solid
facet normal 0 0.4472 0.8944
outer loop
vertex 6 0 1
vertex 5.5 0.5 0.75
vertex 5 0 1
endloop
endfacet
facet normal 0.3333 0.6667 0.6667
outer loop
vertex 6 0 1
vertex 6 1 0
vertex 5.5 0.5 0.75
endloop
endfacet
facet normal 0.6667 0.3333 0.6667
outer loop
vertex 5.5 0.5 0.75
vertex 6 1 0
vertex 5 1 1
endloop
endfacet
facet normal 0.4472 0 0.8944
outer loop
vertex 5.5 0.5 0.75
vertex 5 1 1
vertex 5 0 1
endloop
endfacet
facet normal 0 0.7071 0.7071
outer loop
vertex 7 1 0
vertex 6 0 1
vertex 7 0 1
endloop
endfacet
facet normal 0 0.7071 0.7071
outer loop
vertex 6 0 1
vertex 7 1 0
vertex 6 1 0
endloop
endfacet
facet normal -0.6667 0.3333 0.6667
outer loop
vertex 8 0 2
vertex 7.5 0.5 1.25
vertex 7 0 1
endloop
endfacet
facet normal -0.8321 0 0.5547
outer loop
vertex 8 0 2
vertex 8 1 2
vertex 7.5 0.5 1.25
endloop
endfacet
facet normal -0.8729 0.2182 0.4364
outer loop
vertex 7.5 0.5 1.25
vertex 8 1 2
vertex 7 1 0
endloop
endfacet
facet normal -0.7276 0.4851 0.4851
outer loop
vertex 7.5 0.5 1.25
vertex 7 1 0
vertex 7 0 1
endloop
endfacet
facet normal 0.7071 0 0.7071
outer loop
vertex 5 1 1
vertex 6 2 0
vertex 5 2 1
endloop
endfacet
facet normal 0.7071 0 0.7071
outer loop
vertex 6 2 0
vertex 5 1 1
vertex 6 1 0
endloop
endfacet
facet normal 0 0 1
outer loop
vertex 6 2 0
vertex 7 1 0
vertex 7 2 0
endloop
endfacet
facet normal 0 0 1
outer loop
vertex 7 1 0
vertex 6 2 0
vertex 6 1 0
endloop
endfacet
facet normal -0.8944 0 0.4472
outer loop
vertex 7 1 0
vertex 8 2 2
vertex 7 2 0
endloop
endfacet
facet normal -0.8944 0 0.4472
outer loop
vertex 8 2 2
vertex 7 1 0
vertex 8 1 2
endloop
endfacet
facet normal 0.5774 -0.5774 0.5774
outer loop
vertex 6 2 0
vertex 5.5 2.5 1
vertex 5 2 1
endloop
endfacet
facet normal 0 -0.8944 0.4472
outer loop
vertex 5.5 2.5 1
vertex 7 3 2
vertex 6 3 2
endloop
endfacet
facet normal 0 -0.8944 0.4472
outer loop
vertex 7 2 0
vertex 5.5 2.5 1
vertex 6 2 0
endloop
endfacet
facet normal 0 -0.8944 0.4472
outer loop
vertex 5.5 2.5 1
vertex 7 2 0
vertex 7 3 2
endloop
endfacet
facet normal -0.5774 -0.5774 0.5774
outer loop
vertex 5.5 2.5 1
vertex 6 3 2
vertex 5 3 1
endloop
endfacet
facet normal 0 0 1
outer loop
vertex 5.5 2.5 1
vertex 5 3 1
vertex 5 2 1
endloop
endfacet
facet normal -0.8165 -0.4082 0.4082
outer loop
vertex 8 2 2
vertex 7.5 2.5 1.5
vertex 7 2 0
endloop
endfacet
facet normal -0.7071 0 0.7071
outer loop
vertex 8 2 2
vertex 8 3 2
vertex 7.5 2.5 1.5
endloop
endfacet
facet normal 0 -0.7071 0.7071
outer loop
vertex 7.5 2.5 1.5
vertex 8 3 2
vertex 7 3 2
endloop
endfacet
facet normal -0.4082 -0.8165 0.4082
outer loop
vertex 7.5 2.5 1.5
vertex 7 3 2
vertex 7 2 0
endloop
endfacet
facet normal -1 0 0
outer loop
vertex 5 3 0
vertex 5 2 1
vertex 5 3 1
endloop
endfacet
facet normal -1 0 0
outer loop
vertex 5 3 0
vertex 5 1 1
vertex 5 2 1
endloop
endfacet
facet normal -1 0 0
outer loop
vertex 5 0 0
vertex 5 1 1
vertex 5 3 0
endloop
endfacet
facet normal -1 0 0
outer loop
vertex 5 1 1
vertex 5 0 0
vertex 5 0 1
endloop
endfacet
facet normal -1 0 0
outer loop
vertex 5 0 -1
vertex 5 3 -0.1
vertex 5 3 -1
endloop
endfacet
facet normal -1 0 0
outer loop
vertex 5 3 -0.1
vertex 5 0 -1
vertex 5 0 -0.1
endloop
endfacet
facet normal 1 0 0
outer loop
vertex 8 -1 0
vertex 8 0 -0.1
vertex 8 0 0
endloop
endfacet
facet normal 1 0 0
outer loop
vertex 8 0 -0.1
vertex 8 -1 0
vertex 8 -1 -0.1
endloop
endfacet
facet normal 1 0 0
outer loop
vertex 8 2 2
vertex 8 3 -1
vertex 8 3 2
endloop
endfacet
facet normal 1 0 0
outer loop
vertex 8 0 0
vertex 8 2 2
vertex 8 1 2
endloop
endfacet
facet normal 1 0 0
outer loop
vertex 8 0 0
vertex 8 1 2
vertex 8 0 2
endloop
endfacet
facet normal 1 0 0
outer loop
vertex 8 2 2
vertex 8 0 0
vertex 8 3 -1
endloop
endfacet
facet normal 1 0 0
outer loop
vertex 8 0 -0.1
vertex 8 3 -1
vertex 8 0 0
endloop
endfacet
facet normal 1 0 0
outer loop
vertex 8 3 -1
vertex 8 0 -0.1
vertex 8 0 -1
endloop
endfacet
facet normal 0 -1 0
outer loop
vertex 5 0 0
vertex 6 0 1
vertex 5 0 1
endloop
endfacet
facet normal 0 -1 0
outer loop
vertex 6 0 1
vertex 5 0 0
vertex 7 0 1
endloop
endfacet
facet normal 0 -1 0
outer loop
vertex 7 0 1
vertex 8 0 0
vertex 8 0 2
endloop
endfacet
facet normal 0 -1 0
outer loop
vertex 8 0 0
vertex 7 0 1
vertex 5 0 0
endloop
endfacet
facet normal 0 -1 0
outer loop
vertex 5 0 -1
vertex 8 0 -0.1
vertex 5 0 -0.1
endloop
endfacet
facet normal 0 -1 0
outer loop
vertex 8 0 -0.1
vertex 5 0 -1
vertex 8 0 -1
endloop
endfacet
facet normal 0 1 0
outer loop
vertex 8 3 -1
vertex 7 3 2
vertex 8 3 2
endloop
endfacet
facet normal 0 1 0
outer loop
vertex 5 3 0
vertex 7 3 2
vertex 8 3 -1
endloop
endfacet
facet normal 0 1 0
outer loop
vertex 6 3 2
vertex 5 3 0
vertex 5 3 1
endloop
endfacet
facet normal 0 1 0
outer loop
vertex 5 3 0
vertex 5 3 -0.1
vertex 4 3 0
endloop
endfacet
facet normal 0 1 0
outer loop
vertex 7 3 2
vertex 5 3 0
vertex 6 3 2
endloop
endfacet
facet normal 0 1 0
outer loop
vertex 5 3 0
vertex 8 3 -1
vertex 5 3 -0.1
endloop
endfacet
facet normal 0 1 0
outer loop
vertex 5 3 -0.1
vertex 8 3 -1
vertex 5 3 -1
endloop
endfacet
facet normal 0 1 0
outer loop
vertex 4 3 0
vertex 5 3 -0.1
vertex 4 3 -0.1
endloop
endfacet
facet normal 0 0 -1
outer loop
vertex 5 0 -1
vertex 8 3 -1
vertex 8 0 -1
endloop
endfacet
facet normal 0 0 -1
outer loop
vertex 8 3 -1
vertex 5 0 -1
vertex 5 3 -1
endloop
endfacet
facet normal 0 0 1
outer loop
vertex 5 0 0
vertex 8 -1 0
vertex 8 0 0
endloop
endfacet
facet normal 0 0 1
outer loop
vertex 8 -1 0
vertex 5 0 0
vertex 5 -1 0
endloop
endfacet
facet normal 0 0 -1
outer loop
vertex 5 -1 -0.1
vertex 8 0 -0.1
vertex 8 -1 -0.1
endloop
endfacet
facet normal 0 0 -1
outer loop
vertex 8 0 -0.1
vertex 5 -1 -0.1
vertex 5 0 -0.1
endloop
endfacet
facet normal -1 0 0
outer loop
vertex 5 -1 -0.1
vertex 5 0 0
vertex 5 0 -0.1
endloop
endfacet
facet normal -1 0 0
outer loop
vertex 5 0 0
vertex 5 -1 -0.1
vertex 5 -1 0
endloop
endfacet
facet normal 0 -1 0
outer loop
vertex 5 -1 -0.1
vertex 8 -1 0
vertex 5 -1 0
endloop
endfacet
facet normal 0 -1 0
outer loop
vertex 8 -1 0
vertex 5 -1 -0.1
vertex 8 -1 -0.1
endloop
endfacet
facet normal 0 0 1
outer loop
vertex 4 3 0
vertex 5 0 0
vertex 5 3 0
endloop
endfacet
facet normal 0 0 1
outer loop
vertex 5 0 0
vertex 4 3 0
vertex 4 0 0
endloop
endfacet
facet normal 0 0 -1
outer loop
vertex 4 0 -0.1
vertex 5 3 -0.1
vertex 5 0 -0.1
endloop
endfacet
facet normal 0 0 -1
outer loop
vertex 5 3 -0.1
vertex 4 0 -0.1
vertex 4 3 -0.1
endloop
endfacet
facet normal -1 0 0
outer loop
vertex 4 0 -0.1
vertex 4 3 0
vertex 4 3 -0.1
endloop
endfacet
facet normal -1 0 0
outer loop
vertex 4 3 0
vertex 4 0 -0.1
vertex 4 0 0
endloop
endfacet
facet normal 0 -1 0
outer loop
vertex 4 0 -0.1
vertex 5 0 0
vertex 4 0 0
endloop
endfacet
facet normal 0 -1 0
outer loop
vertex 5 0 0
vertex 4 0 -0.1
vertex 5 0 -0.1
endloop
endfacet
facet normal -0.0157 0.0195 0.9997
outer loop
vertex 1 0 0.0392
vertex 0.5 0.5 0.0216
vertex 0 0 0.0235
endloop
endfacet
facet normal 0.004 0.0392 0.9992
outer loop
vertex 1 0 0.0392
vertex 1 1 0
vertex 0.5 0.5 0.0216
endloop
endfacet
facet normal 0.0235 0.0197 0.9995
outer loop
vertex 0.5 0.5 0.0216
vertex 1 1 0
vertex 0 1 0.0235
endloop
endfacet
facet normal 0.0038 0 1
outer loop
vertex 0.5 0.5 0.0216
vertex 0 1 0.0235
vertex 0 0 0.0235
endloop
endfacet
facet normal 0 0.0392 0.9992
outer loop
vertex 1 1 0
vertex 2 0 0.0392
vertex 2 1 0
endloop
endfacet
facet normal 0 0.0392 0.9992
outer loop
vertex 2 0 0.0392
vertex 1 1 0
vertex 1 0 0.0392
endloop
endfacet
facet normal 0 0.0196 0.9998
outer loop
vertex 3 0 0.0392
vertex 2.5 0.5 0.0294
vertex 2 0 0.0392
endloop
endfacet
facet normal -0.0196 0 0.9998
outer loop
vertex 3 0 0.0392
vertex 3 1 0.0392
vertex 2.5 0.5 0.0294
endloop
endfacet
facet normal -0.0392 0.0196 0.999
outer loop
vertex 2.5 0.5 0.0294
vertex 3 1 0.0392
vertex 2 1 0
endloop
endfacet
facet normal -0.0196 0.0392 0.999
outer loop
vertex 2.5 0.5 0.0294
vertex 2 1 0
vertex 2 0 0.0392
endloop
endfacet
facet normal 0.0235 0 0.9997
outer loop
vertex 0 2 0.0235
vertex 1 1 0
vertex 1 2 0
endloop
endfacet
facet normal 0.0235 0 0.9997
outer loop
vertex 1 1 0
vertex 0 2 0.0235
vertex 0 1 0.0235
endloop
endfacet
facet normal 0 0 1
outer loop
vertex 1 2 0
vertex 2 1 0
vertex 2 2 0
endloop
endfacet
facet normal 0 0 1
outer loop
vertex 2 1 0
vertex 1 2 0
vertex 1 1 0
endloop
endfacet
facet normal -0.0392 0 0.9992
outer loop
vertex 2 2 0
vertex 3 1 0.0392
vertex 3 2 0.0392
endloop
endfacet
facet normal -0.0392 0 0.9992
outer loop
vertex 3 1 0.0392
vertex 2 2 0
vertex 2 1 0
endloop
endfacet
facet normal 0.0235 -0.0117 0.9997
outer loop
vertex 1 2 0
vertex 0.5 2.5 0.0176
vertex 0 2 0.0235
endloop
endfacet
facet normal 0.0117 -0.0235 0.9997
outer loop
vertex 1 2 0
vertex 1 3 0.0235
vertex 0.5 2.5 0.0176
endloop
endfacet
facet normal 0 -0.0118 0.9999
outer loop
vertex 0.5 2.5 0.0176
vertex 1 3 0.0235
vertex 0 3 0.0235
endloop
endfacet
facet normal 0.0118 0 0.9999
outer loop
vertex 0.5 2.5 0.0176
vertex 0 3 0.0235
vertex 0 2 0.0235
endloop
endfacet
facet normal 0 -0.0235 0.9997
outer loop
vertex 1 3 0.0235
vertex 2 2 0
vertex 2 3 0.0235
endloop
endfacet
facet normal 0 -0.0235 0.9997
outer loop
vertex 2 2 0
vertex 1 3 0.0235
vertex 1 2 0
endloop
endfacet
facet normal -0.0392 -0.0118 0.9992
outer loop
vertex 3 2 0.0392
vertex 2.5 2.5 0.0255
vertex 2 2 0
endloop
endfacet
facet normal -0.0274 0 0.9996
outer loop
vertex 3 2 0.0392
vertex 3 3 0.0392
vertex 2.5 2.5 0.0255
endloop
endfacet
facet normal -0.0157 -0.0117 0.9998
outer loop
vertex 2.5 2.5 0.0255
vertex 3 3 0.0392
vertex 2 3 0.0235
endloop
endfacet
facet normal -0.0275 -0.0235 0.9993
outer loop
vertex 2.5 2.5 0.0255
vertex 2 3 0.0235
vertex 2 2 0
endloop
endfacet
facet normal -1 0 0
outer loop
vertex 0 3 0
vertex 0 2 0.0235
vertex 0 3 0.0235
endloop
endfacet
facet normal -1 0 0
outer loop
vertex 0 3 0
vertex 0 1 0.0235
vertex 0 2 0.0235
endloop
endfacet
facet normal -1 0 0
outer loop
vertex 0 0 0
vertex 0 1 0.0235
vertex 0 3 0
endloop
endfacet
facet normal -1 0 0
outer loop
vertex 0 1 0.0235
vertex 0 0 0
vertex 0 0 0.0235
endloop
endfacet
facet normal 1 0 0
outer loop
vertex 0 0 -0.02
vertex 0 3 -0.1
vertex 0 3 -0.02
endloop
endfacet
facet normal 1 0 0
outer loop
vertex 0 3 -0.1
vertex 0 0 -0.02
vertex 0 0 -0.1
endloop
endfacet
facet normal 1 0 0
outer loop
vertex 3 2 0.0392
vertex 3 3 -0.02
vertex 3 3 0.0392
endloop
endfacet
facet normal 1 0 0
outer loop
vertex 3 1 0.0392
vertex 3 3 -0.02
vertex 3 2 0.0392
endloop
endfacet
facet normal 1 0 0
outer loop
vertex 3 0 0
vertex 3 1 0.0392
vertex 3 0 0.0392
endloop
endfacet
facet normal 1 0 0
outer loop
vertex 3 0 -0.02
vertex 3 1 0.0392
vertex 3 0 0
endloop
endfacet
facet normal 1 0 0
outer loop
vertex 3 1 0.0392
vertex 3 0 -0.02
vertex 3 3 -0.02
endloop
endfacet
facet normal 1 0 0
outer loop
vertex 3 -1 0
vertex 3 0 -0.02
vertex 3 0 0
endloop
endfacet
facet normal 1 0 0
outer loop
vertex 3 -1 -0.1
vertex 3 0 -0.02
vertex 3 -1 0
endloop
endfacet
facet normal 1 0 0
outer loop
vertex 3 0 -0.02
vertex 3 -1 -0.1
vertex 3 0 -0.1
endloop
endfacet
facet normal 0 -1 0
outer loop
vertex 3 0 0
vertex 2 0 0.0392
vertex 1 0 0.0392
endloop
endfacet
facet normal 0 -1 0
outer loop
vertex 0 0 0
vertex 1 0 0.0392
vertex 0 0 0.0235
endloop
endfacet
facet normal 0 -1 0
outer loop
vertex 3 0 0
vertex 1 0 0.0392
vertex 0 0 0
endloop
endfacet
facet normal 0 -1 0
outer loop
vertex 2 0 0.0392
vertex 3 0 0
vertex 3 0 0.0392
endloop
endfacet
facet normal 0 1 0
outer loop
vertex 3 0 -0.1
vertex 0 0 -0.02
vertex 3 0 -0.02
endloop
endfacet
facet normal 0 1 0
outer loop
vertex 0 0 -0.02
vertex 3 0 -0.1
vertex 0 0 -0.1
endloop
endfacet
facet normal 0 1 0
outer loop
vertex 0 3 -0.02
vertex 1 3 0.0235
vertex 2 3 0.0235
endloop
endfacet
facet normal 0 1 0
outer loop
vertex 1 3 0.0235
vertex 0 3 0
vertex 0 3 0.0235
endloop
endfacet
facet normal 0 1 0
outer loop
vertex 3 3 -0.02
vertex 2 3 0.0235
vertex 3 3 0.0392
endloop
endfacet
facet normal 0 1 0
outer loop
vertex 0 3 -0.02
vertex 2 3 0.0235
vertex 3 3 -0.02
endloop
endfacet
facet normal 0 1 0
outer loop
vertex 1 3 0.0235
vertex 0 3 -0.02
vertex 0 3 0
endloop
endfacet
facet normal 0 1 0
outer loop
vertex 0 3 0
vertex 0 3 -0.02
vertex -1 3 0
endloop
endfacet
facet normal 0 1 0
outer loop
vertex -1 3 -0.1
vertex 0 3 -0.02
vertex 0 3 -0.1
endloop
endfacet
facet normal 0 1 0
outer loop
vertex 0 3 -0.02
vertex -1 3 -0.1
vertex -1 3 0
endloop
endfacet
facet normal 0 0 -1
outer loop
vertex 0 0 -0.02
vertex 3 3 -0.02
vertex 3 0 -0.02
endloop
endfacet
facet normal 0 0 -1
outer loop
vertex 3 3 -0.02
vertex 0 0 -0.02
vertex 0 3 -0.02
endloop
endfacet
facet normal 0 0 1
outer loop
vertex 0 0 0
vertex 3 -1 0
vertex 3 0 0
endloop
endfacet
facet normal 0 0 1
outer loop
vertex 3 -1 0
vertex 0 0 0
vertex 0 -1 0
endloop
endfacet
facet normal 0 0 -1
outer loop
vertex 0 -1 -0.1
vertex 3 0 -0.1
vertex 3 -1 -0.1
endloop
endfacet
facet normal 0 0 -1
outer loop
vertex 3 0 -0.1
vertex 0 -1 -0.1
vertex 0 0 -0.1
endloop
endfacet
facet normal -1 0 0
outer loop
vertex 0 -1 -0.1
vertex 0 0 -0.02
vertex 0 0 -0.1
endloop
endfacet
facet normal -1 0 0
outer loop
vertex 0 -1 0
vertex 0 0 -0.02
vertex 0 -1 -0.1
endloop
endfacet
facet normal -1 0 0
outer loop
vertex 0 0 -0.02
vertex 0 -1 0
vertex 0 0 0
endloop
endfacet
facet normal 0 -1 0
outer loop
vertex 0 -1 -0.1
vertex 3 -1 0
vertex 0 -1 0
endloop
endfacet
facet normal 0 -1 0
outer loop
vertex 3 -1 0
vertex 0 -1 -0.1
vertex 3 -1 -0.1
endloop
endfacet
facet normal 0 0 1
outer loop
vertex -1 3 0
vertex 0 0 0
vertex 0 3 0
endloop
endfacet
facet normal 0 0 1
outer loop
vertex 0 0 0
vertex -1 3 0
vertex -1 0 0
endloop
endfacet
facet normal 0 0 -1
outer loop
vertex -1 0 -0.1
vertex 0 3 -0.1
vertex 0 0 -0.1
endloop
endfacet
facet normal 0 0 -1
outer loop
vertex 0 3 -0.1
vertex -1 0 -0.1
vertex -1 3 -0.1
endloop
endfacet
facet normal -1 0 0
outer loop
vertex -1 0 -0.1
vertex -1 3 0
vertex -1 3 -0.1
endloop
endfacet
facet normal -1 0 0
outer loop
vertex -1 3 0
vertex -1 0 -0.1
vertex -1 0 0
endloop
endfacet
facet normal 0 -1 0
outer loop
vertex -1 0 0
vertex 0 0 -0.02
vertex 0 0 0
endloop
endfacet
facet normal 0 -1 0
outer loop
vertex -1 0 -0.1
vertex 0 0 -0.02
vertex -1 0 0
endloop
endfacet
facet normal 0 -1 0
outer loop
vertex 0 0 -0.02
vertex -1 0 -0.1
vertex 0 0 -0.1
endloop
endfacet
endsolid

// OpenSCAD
scale([1,1,0.02]) surface("issue1223b.png");
translate([0,-1,-0.1]) cube([3,1,0.1]);
translate([-1,0,-0.1]) cube([1,3,0.1]);

translate([5,0,0]) {
    surface("issue1223b.dat");
    translate([0,-1,-0.1]) cube([3,1,0.1]);
    translate([-1,0,-0.1]) cube([1,3,0.1]);
}
